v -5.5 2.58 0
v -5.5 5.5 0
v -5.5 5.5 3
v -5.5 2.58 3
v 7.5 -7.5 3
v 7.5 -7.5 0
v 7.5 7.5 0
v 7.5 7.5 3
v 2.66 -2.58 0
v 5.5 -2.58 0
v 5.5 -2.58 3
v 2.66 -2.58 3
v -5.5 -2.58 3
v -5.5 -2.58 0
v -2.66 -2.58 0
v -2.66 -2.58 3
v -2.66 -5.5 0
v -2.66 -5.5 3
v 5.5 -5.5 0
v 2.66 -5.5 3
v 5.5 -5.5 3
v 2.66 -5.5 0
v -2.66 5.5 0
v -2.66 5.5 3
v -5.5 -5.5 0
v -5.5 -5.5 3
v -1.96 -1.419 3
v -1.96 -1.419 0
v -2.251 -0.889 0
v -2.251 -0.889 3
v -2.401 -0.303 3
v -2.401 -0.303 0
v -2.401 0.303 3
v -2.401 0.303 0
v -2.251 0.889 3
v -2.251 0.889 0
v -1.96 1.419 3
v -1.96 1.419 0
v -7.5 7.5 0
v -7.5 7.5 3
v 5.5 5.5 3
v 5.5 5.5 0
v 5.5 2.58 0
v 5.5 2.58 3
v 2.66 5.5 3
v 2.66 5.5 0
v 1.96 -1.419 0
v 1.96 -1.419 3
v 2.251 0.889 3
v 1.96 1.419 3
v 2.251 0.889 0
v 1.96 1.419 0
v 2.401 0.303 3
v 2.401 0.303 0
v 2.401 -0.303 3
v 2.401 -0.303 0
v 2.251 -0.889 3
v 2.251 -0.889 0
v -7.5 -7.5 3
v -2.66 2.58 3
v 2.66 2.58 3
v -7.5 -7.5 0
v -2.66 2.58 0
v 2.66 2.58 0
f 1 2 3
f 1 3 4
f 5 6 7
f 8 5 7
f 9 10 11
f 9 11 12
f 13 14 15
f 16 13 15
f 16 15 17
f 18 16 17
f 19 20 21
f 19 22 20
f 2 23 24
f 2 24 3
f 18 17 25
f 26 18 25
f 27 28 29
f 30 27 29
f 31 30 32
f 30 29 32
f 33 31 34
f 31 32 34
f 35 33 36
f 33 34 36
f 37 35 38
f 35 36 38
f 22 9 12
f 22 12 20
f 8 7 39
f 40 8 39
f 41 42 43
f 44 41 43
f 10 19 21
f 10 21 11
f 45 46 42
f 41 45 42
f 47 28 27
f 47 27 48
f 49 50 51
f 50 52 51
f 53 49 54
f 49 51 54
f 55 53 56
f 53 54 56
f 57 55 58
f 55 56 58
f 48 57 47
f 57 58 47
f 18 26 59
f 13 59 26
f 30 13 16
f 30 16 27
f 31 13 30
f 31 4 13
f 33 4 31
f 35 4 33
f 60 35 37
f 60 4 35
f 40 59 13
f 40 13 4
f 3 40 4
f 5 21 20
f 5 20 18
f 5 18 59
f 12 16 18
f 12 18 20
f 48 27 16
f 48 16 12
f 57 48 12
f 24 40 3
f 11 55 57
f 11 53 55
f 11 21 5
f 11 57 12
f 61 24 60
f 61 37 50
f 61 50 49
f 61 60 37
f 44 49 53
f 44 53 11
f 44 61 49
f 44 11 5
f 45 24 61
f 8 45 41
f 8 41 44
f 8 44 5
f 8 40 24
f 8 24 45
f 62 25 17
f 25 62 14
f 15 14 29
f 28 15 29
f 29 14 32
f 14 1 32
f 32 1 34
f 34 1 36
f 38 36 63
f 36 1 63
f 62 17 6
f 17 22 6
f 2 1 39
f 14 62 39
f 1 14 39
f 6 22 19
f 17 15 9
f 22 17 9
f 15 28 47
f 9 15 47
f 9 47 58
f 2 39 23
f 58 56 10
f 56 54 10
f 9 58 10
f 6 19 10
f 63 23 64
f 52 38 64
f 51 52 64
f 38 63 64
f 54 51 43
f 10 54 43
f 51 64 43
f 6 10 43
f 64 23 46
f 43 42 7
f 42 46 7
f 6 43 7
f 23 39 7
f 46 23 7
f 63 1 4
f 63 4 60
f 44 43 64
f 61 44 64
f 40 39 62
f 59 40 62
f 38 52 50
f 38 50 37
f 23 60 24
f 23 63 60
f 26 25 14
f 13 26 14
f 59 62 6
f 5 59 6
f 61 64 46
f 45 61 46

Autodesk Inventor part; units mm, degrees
ref_plane "YZ Plane" through (0, 0, 0) normal (1, 0, 0) x (0, 1, 0)
ref_plane "XZ Plane" through (0, 0, 0) normal (0, 1, 0) x (-1, 0, 0)
ref_plane "XY Plane" through (0, 0, 0) normal (0, 0, 1) x (1, 0, 0)
sketch "Sketch1" plane through (0, 0, 0) normal (0, 0, 1) x (1, 0, 0)
  line L0 (-1.96, -1.4194) -> (1.96, -1.4194)
  line L1 (1.96, 1.4194) -> (-1.96, 1.4194)
  arc A0 (-1.96, 1.4194) -> (-1.96, -1.4194) centre (0, 0) ccw
  arc A1 (1.96, -1.4194) -> (1.96, 1.4194) centre (0, 0) ccw
  line L2 (-7.5, -7.5) -> (7.5, -7.5)
  line L3 (7.5, -7.5) -> (7.5, 7.5)
  line L4 (7.5, 7.5) -> (-7.5, 7.5)
  line L5 (-7.5, 7.5) -> (-7.5, -7.5)
  line L6 (-7.5, -7.5) -> (7.5, 7.5) construction
  line L7 (7.5, -7.5) -> (-7.5, 7.5) construction
  line L8 (-5.5, 2.58) -> (-2.66, 2.58)
  line L9 (-2.66, 2.58) -> (-2.66, 5.5)
  line L10 (-2.66, 5.5) -> (-5.5, 5.5)
  line L11 (-5.5, 5.5) -> (-5.5, 2.58)
  line L12 (0, 0) -> (0, 4.08) construction
  line L13 (0, 0) -> (5.4269, 0) construction
  line L14 (5.5, 2.58) -> (2.66, 2.58)
  line L15 (2.66, 2.58) -> (2.66, 5.5)
  line L16 (2.66, 5.5) -> (5.5, 5.5)
  line L17 (5.5, 5.5) -> (5.5, 2.58)
  line L18 (-5.5, -2.58) -> (-2.66, -2.58)
  line L19 (-2.66, -2.58) -> (-2.66, -5.5)
  line L20 (-2.66, -5.5) -> (-5.5, -5.5)
  line L21 (-5.5, -5.5) -> (-5.5, -2.58)
  line L22 (2.66, -2.58) -> (2.66, -5.5)
  line L23 (2.66, -5.5) -> (5.5, -5.5)
  line L24 (5.5, -5.5) -> (5.5, -2.58)
  line L25 (5.5, -2.58) -> (2.66, -2.58)
  point P0 (0, -4.08)
  dimension "d3" = 3.92
  dimension "d4" = 2.42
  dimension "d5" = 15
  dimension "d7" = 2.84
  dimension "d8" = 2.92
  dimension "d9" = 2
  dimension "d10" = 2
extrude "Extrusion1" add sketch "Sketch1" along normal blind 3
properties part number "motor_bottom"
